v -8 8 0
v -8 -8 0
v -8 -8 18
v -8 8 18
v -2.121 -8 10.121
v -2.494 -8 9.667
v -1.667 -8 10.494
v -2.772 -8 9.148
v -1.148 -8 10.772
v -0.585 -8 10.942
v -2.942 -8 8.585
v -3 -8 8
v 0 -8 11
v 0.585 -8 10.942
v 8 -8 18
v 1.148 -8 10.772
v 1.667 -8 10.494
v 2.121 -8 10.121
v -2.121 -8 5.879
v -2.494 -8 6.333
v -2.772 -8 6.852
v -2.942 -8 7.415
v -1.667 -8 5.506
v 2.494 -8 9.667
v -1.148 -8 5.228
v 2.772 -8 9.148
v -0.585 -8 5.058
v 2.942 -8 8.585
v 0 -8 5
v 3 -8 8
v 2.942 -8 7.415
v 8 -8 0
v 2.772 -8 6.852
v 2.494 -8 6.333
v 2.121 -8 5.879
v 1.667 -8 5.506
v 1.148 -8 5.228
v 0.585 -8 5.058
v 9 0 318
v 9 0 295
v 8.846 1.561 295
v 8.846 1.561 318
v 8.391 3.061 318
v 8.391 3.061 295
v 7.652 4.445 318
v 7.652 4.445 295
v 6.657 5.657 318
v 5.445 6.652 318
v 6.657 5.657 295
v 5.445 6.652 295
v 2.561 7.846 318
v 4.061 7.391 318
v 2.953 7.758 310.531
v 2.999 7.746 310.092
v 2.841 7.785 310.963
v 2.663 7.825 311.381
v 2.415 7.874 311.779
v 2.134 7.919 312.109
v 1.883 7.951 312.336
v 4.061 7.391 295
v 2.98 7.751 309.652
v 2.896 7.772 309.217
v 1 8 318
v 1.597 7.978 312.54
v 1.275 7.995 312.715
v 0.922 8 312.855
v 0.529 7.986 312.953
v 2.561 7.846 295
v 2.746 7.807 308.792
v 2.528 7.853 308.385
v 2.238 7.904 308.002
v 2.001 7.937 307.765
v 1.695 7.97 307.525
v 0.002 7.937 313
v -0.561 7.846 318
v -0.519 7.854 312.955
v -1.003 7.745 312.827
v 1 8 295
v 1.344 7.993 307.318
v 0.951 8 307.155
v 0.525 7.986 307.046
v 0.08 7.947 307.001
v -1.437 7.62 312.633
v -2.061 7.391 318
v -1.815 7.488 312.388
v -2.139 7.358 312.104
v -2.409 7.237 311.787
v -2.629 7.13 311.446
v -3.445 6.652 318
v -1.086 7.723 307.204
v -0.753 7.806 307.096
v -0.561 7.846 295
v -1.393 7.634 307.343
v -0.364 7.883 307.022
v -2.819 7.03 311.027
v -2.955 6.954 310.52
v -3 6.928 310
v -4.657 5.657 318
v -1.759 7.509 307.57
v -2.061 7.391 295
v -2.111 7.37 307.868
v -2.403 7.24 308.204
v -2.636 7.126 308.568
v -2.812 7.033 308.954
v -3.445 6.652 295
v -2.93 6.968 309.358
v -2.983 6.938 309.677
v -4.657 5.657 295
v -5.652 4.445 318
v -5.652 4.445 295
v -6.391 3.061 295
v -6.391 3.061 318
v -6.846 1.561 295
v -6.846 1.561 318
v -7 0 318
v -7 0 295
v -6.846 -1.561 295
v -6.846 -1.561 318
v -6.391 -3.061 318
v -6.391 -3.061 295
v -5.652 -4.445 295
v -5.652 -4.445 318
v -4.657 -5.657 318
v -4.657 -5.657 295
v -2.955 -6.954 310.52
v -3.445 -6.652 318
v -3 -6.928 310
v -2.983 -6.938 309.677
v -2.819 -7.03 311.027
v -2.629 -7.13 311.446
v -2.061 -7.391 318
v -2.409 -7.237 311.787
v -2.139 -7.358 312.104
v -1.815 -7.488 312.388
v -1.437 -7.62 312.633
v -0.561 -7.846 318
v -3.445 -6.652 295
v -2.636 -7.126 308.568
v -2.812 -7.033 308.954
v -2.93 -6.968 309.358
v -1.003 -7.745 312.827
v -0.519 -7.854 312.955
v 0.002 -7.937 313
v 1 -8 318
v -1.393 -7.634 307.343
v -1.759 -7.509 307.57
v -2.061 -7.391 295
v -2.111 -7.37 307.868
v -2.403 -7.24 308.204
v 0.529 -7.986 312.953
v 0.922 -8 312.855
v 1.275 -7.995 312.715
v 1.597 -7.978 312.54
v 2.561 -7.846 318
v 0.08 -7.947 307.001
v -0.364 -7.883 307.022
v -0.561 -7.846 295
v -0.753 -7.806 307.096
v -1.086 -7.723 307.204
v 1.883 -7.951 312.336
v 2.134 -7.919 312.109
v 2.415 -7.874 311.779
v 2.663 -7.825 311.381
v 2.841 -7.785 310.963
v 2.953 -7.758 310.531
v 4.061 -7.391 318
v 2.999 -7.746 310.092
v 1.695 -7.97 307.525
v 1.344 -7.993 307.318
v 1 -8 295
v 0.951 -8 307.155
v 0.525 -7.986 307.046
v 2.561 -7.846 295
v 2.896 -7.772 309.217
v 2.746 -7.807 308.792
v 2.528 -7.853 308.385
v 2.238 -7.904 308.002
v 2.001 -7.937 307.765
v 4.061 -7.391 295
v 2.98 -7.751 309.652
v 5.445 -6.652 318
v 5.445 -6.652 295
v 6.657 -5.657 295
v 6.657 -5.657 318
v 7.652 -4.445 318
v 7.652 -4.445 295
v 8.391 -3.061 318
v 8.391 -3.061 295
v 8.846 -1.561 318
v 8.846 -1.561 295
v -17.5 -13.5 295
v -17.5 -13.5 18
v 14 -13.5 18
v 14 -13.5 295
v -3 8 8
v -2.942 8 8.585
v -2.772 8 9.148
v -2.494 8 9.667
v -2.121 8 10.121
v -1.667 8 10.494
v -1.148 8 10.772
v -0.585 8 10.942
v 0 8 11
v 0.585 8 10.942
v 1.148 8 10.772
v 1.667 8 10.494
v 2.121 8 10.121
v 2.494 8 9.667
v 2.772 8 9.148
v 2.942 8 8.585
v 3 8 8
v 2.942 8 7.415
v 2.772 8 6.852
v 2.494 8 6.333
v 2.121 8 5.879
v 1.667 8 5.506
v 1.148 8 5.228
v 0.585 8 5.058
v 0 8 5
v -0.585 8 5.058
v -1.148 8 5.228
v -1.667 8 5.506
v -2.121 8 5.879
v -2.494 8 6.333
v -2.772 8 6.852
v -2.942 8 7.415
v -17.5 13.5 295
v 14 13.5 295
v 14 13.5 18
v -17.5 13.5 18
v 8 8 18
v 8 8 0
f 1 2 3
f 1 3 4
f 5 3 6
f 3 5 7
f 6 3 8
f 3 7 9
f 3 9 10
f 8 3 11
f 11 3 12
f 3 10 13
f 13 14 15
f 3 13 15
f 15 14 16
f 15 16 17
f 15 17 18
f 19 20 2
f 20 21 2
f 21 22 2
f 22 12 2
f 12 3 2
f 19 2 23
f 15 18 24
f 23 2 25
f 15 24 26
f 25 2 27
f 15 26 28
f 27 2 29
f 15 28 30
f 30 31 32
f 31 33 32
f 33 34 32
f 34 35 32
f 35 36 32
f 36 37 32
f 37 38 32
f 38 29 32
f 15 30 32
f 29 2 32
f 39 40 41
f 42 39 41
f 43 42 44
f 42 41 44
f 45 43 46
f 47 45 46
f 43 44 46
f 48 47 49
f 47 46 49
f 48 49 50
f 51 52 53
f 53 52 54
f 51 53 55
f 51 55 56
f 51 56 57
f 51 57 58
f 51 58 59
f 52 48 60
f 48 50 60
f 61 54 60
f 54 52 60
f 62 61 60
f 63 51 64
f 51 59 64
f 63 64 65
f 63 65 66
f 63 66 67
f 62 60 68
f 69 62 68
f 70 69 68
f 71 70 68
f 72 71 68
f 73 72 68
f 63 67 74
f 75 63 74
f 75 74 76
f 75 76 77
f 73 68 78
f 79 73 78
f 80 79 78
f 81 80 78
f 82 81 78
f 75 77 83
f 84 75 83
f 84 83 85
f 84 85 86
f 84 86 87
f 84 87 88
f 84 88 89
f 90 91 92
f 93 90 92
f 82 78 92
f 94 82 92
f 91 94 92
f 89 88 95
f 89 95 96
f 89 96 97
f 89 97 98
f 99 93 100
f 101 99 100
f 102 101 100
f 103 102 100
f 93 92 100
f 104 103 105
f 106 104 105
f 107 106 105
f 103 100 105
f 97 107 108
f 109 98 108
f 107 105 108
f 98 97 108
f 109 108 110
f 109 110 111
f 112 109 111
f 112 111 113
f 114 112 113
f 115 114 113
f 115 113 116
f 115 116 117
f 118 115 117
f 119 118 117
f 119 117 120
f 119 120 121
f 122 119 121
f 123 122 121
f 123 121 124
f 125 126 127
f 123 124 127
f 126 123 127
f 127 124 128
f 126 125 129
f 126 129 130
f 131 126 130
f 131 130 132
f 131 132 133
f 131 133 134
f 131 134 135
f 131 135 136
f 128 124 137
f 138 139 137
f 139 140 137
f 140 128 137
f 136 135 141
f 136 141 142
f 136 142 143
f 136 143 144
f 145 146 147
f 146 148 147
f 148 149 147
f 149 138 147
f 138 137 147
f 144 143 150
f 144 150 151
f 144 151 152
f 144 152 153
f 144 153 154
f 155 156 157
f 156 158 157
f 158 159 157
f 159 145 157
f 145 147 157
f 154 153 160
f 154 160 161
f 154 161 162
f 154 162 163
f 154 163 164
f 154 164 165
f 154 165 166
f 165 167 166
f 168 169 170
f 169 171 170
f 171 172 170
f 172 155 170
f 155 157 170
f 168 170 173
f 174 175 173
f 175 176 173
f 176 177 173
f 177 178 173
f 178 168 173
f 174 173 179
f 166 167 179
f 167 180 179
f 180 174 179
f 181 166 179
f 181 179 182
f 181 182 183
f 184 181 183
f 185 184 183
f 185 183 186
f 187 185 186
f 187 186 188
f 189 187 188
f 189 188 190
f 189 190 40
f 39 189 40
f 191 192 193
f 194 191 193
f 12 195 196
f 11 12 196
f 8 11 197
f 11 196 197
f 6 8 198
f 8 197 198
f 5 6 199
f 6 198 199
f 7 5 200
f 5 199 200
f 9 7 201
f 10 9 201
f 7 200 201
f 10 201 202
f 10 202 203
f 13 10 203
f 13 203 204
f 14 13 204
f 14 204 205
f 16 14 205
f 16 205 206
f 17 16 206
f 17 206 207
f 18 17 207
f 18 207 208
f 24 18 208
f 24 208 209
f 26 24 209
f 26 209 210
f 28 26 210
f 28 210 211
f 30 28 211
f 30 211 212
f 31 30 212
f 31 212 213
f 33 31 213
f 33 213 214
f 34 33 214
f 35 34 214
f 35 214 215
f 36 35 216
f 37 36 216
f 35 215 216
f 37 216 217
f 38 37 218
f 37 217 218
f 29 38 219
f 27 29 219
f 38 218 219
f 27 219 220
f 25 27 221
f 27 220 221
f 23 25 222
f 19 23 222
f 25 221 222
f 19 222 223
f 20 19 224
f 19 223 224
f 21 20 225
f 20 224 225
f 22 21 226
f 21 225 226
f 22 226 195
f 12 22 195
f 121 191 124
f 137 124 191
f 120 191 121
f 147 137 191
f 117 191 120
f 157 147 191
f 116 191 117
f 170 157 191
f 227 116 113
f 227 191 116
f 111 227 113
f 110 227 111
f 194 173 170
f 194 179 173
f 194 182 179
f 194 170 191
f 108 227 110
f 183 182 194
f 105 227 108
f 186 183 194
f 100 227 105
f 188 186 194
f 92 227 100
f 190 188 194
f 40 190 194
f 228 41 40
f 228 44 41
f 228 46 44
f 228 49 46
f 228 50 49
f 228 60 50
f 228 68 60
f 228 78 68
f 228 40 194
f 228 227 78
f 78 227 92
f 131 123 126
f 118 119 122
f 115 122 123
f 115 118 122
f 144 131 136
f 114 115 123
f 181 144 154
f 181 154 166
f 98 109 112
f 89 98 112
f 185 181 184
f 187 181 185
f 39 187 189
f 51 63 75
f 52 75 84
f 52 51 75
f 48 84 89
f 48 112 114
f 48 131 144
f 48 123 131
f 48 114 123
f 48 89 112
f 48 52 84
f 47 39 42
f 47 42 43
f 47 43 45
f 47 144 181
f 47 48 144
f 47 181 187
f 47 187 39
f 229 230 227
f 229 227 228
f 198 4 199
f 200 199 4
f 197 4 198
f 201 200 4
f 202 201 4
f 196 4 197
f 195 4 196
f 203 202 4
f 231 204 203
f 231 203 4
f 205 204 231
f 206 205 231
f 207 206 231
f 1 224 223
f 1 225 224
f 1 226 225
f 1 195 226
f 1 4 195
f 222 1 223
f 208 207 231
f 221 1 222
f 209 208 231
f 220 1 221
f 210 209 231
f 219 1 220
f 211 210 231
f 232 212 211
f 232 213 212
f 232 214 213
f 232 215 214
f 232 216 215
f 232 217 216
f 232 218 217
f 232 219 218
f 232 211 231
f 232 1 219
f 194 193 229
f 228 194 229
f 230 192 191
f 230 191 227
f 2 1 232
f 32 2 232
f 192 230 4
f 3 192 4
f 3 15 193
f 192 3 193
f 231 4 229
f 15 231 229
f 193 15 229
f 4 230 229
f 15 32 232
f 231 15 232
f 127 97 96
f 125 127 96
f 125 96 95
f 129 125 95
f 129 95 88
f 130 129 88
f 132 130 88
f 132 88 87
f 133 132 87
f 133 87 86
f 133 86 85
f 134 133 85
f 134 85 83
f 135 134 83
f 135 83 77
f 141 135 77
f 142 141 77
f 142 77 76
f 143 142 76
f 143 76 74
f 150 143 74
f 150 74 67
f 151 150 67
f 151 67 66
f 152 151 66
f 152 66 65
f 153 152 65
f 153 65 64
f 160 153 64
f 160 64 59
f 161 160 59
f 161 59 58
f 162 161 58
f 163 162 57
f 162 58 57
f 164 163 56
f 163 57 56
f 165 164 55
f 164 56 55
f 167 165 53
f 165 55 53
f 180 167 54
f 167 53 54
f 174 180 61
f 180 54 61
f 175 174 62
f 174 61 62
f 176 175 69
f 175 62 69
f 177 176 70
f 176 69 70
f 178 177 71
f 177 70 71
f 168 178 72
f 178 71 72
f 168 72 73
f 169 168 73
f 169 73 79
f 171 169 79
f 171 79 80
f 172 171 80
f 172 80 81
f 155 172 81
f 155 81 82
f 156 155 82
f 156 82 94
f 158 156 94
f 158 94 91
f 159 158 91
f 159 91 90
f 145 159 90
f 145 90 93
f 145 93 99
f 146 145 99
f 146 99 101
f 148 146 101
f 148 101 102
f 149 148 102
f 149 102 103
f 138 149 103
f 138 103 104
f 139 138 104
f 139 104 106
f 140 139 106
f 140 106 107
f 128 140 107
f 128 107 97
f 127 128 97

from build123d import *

# Parameters (mm, degrees)
F0_W     = 16
F0_H     = 16
F1_DEPTH = 18
F2_W     = 31.5
F2_H     = 27
F2_W_2   = 16
F2_H_2   = 16
F3_DEPTH = 277
F4_R     = 8
F5_DEPTH = 23
F6_R     = 3
F7_DEPTH = 25


with BuildPart() as f1:
    # F0 (on Top) → F1 (new body)
    with BuildSketch(Plane.XY):
        Rectangle(F0_W, F0_H)
    extrude(amount=F1_DEPTH)

    # F2 (on face) → F3 (join)
    with BuildSketch(Plane.XY.offset(18)):
        with Locations((-1.75, 0)):
            Rectangle(F2_W, F2_H)
        Rectangle(F2_W_2, F2_H_2, mode=Mode.SUBTRACT)
        Rectangle(F2_W_2, F2_H_2)
    extrude(amount=F3_DEPTH)

    # F4 (on face) → F5 (join)
    with BuildSketch(Plane.XY.offset(295)):
        with Locations((1, 0)):
            Circle(F4_R)
    extrude(amount=F5_DEPTH)

    # F6 (on face) → F7 (cut)
    with BuildSketch(Plane(origin=(0, 13.5, 0), x_dir=(-1, 0, 0), z_dir=(0, 1, 0))):
        with Locations((0, 8)):
            Circle(F6_R)
        with Locations((0, 310)):
            Circle(F6_R)
    extrude(amount=-F7_DEPTH, mode=Mode.SUBTRACT)


solid = f1.part
